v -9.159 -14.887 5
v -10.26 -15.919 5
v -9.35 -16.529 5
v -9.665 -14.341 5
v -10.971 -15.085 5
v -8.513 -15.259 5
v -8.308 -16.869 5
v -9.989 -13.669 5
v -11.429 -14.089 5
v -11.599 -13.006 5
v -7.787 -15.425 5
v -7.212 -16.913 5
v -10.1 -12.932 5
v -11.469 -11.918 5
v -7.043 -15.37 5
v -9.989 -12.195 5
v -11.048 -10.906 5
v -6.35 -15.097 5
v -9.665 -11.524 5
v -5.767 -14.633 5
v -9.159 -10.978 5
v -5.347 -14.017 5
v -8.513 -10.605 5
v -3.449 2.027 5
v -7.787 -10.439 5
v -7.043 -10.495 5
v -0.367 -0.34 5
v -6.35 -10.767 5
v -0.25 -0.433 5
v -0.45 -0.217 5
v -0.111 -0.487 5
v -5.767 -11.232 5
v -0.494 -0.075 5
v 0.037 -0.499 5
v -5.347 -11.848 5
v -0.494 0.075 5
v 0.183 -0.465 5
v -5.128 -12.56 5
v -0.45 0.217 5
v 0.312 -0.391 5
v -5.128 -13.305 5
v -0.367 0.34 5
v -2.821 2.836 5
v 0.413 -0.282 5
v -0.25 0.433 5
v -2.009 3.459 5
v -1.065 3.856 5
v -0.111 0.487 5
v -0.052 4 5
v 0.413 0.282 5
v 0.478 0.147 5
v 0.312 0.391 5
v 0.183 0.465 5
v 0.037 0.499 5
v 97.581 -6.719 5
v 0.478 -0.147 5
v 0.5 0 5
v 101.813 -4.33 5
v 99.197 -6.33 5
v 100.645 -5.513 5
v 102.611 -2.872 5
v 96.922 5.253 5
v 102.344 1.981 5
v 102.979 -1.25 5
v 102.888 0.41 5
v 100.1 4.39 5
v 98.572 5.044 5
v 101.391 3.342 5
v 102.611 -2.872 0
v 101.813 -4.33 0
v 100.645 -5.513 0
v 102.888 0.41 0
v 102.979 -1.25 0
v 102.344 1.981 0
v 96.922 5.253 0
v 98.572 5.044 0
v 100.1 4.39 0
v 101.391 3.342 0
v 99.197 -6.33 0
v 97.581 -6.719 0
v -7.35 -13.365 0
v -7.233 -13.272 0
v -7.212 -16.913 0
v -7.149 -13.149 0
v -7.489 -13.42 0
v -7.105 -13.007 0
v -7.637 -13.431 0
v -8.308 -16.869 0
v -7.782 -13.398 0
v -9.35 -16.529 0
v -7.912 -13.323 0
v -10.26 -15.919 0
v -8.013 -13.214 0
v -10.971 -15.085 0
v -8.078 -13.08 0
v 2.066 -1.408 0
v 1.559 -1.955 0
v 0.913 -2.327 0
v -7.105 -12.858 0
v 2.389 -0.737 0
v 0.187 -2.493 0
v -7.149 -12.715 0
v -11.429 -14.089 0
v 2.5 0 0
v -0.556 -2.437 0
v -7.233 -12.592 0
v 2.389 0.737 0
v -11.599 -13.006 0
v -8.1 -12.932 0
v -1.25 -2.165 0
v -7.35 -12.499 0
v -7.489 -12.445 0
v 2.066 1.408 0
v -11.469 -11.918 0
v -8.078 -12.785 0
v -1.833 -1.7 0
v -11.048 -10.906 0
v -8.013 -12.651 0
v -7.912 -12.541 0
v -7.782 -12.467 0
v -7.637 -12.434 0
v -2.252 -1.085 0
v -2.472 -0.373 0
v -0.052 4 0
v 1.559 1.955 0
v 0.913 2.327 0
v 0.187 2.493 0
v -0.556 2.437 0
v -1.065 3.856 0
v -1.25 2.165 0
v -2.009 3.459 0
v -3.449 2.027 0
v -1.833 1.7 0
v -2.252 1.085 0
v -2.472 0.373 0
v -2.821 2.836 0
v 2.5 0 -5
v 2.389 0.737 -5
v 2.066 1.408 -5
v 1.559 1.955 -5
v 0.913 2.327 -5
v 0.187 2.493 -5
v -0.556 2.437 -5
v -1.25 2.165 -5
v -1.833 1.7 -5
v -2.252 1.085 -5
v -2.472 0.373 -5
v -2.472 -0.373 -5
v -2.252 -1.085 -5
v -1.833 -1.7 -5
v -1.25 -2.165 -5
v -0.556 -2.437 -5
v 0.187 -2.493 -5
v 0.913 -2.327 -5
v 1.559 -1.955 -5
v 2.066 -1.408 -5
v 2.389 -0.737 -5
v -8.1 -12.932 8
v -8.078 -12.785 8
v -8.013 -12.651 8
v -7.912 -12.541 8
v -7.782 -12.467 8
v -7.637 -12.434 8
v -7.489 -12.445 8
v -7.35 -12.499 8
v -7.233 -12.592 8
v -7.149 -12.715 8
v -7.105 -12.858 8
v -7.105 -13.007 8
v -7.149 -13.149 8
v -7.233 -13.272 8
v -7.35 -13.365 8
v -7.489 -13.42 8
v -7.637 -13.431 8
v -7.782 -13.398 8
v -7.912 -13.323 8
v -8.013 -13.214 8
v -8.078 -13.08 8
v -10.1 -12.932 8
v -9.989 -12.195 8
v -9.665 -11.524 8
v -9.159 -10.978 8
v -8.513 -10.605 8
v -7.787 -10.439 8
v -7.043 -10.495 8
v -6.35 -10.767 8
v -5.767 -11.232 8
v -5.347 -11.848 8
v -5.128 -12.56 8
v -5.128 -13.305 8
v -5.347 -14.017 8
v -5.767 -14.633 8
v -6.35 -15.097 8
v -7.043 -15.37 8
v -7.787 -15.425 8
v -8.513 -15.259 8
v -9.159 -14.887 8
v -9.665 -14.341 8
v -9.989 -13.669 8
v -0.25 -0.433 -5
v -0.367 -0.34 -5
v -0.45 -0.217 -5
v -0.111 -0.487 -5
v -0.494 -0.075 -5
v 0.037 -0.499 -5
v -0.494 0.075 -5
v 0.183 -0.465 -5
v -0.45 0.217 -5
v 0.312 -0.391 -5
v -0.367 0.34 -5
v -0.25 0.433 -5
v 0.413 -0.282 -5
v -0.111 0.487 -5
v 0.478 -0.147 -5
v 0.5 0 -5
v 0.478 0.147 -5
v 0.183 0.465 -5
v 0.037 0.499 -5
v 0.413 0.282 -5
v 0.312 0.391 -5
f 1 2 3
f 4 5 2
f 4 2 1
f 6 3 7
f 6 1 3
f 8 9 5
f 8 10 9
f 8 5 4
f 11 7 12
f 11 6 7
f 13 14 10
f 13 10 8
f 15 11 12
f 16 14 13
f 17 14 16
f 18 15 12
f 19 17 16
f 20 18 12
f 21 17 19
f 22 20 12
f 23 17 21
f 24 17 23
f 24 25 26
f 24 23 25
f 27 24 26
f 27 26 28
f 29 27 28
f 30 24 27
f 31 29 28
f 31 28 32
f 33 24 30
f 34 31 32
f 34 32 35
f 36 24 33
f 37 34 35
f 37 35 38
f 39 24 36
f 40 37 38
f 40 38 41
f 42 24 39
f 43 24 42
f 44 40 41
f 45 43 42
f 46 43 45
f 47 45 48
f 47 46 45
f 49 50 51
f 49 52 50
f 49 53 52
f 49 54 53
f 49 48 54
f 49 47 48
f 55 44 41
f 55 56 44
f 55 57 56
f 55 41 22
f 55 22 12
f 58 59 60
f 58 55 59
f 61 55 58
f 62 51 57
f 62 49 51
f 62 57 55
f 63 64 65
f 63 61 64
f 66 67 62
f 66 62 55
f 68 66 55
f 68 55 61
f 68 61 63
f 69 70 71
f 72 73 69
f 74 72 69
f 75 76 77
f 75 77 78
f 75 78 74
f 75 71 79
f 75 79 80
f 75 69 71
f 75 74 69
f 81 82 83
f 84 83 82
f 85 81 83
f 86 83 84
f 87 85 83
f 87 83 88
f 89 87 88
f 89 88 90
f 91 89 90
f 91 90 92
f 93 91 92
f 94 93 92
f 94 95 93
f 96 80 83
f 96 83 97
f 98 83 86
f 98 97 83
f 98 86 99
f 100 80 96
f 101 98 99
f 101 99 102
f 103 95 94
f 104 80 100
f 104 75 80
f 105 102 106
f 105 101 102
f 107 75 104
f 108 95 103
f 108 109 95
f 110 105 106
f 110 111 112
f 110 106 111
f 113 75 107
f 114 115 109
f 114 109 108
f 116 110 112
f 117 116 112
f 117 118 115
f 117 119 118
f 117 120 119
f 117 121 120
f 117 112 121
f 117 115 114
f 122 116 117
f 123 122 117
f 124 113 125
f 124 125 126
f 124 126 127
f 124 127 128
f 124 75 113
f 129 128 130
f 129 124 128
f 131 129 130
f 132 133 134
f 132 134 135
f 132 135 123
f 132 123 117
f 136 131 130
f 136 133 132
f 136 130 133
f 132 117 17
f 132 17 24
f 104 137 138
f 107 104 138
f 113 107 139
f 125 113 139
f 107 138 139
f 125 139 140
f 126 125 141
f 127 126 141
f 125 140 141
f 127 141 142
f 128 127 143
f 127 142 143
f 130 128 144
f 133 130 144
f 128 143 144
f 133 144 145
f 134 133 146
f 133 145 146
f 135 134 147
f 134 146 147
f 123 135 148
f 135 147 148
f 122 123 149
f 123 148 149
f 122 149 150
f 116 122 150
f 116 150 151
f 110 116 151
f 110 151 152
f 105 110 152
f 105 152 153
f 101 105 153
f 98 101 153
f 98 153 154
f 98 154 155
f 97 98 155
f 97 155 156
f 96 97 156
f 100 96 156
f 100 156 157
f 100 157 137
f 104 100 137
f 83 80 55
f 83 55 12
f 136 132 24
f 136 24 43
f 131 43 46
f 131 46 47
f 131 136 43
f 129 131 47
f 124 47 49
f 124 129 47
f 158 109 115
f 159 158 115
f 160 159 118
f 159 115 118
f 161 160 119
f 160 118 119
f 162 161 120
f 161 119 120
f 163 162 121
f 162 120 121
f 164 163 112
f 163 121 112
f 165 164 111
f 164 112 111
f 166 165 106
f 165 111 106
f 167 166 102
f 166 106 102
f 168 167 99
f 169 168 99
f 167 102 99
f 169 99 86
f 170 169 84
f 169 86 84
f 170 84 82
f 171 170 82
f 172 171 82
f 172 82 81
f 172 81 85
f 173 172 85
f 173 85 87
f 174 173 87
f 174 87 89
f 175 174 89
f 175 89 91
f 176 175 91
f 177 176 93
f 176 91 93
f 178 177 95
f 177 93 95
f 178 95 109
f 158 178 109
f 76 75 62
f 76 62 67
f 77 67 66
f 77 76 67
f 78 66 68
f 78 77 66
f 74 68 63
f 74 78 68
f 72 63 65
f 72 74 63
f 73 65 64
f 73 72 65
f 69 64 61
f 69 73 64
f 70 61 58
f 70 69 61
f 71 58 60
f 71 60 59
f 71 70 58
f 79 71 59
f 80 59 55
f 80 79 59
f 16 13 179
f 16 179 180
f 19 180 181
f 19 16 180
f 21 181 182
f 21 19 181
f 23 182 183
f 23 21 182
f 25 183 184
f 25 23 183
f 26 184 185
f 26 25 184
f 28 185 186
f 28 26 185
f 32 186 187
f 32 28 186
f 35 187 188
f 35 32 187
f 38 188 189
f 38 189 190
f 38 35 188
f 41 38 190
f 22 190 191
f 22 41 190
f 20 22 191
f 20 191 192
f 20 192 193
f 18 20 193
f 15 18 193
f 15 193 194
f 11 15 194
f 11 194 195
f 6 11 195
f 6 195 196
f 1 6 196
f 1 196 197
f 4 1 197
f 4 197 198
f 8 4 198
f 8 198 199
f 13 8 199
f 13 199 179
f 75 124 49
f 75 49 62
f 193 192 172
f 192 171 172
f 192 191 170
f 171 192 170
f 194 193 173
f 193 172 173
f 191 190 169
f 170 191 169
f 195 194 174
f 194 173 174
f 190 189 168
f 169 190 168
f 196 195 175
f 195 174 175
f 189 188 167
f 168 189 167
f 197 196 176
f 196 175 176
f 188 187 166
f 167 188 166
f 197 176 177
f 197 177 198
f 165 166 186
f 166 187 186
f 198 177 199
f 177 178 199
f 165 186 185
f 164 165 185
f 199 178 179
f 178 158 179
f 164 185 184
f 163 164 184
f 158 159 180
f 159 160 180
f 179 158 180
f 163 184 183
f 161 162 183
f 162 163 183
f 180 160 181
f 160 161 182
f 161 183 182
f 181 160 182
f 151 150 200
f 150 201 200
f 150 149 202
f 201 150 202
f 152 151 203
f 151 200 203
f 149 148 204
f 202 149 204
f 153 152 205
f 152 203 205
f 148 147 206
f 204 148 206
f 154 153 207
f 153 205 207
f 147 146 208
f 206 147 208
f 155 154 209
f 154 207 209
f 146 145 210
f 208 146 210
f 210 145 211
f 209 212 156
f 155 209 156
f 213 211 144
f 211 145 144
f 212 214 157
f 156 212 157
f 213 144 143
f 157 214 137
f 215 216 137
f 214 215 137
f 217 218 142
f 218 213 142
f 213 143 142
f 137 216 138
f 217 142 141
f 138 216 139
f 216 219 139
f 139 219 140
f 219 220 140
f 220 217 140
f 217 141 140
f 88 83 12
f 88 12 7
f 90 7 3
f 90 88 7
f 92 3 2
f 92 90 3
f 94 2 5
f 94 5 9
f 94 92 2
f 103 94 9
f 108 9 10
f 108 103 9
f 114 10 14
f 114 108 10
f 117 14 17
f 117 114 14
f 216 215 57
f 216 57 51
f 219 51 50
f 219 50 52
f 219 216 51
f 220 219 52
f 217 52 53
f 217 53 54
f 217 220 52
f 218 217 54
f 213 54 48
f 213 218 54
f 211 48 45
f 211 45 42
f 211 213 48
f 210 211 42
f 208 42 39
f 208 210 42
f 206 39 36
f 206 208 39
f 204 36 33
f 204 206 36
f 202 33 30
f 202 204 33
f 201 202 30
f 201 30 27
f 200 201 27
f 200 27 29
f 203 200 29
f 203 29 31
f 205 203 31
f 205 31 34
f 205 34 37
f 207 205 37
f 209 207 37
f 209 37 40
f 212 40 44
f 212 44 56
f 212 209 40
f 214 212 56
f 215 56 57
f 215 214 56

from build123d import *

# Parameters (mm, degrees)
SKETCH3_R           = 2.5
BOSS_EXTRUDE1_DEPTH = 5
BOSS_EXTRUDE2_START = -10
SKETCH4_R           = 2.5
SKETCH4_R_2         = 0.5
BOSS_EXTRUDE2_DEPTH = 10
SKETCH5_R           = 2.5
SKETCH5_R_2         = 0.5
BOSS_EXTRUDE3_DEPTH = 8


with BuildPart() as part:
    # Sketch3 → Boss-Extrude1 (new body)
    with BuildSketch(Plane.XY):
        with BuildLine():
            Line((-11.048388083, -10.905646279), (-3.448601602, 2.026609728))
            ThreePointArc((-3.448601602, 2.026609728), (-2.00903777, 3.458867913), (-0.051681177, 3.999666118))
            Line((-0.051681177, 3.999666118), (96.922478234, 5.252705394))
            ThreePointArc((96.922478234, 5.252705394), (102.990943647, -0.417257421), (97.580968918, -6.718600471))
            Line((97.580968918, -6.718600471), (-7.212473869, -16.913460466))
            ThreePointArc((-7.212473869, -16.913460466), (-10.971185359, -15.084852023), (-11.048388083, -10.905646279))
        make_face()
        with Locations((-7.599786481, -12.932256007)):
            Circle(SKETCH3_R, mode=Mode.SUBTRACT)
        Circle(SKETCH3_R, mode=Mode.SUBTRACT)
    extrude(amount=BOSS_EXTRUDE1_DEPTH)

    # Sketch4 → Boss-Extrude2 (add)
    with BuildSketch(Plane.XY.offset(5).offset(BOSS_EXTRUDE2_START)):
        Circle(SKETCH4_R)
        Circle(SKETCH4_R_2, mode=Mode.SUBTRACT)
    extrude(amount=BOSS_EXTRUDE2_DEPTH)

    # Sketch5 → Boss-Extrude3 (add)
    with BuildSketch(Plane(origin=(0, 0, 0), x_dir=(-1, 0, 0), z_dir=(0, 0, -1))):
        with Locations((7.599786481, -12.932256007)):
            Circle(SKETCH5_R)
        with Locations((7.599786481, -12.932256007)):
            Circle(SKETCH5_R_2, mode=Mode.SUBTRACT)
    extrude(amount=-BOSS_EXTRUDE3_DEPTH)


solid = part.part
